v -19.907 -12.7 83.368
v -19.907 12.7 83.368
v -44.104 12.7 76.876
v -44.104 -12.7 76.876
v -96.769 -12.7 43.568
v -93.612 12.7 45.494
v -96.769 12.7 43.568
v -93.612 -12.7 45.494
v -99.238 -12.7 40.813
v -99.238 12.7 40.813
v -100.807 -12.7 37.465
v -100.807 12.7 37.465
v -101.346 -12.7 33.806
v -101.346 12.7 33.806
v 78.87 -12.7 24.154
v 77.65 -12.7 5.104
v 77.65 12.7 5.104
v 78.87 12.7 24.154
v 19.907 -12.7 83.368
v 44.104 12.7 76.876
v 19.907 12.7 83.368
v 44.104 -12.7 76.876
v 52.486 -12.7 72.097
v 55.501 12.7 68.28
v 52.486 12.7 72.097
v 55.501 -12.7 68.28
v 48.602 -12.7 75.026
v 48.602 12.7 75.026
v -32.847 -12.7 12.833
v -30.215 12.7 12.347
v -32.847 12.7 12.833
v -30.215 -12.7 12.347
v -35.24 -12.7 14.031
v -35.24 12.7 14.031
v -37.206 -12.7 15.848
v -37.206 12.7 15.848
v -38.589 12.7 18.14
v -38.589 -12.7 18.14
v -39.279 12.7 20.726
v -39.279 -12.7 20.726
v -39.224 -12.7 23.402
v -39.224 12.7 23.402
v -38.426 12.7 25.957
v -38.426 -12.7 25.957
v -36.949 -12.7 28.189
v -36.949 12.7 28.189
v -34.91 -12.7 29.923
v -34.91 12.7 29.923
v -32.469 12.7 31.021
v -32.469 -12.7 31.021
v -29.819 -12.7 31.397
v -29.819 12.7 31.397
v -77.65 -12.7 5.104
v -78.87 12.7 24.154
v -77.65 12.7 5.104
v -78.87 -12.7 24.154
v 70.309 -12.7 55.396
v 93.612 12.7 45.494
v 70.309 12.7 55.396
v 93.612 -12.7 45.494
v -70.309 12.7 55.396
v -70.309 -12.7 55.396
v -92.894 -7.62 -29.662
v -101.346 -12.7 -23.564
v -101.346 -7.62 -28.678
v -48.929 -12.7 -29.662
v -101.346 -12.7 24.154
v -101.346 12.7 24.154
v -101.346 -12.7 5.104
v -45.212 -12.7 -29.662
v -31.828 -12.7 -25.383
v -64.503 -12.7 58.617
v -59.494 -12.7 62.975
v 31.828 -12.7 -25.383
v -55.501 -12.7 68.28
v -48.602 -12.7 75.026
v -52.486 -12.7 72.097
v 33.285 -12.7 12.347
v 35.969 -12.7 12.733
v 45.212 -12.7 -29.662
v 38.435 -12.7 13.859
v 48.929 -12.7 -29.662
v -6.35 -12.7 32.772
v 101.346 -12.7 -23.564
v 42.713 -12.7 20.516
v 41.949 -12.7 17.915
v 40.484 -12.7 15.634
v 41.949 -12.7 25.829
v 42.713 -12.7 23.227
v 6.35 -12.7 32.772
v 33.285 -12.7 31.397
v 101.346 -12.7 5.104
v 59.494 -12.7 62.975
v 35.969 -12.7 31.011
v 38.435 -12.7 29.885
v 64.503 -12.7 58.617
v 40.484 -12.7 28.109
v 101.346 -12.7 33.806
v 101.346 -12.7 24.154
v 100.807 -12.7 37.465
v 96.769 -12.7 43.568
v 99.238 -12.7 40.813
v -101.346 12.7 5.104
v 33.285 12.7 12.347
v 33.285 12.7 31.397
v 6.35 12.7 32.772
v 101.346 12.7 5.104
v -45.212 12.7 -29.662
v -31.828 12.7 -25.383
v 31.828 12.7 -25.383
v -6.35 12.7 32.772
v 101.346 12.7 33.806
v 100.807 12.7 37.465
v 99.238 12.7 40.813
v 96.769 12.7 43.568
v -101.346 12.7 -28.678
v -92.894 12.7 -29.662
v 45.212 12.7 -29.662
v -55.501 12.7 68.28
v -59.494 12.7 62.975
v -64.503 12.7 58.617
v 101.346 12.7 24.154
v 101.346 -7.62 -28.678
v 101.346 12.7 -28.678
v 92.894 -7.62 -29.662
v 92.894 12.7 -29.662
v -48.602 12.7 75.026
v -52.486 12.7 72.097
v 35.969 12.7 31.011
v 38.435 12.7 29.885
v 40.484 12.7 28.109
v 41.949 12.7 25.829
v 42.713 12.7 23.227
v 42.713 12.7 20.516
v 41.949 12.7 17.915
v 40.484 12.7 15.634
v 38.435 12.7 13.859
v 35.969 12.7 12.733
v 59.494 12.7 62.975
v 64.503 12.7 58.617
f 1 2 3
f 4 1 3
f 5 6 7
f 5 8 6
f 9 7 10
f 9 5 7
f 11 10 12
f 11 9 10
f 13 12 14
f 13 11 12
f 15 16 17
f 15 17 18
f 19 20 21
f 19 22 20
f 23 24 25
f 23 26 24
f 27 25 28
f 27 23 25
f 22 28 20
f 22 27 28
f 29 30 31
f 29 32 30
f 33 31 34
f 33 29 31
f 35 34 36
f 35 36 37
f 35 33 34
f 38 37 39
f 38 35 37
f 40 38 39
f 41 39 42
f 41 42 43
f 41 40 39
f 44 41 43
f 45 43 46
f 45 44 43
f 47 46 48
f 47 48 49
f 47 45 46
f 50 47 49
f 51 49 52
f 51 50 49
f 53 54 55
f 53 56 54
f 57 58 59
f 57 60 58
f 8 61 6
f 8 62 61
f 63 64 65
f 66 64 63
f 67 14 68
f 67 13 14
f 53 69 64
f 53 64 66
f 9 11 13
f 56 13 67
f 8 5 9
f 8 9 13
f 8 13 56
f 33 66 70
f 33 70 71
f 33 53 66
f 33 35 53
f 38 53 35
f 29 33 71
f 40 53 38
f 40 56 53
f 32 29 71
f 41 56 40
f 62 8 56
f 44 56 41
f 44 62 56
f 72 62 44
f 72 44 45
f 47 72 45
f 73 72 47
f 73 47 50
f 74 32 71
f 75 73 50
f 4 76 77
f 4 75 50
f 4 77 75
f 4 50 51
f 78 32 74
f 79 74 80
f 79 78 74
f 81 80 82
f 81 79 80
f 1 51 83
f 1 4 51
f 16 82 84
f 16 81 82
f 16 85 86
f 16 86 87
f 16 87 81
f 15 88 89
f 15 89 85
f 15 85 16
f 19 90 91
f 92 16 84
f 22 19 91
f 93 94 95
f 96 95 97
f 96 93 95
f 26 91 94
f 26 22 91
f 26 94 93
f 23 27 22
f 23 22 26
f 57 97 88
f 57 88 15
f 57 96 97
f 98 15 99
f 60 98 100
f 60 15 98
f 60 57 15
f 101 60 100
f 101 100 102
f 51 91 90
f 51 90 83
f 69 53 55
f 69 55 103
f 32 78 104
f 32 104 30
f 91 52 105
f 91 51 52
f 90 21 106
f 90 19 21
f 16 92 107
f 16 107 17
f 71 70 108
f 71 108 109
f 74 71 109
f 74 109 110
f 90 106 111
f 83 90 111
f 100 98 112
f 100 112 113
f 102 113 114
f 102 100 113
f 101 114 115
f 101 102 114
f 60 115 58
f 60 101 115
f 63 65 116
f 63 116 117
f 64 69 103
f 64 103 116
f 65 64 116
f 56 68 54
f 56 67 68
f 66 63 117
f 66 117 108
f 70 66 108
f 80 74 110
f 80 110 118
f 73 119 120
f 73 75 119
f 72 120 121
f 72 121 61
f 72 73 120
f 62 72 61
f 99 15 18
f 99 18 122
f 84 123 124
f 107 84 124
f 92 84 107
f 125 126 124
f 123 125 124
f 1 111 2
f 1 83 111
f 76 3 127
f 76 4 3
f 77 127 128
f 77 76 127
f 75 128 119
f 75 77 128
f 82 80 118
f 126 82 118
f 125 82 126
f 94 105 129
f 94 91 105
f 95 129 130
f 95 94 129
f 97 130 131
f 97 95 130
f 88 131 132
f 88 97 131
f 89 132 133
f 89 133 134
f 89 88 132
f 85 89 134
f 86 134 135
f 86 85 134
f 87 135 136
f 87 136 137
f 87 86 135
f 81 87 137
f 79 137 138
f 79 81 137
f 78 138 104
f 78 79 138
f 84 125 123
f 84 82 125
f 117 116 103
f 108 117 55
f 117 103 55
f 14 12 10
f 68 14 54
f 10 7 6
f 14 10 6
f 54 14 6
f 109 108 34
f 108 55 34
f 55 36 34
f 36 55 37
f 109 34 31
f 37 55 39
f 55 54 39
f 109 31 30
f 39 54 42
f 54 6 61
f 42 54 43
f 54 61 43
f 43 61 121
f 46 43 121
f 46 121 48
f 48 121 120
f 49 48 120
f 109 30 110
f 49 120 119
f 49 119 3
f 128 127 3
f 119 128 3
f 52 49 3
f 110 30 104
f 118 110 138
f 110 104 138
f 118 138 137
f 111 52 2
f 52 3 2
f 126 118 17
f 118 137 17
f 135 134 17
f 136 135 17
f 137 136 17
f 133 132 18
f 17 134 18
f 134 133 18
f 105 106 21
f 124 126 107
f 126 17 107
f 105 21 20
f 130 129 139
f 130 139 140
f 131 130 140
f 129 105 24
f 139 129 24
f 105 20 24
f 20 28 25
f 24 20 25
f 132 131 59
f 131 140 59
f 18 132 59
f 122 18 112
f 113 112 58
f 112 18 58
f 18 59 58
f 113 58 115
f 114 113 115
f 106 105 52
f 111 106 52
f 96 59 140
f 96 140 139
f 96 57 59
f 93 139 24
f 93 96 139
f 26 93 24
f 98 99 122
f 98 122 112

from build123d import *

# Parameters (mm, degrees)
F1_DEPTH = 12.7
F2_SIZE  = 5.08


with BuildPart() as f1:
    # F0 (on Front) → F1 (new body, symmetric)
    with BuildSketch(Plane.XZ):
        with BuildLine():
            Line((-78.86985, 24.153677), (-77.649682, 5.103677))
            Line((-77.649682, 5.103677), (-101.346, 5.103677))
            Line((-101.346, 5.103677), (-101.346, -28.678323))
            Line((-101.346, -28.678323), (-92.893675, -29.661545))
            Line((-92.893675, -29.661545), (-45.212, -29.661545))
            Line((-45.212, -29.661545), (-31.82804, -25.383405))
            Line((-31.82804, -25.383405), (31.82804, -25.383405))
            Line((31.82804, -25.383405), (45.212, -29.661545))
            Line((45.212, -29.661545), (92.893675, -29.661545))
            Line((92.893675, -29.661545), (101.346, -28.678323))
            Line((101.346, -28.678323), (101.346, 5.103677))
            Line((101.346, 5.103677), (77.649682, 5.103677))
            Line((77.649682, 5.103677), (78.86985, 24.153677))
            Line((78.86985, 24.153677), (101.346, 24.153677))
            Line((101.346, 24.153677), (101.346, 33.805677))
            ThreePointArc((101.346, 33.805677), (99.237568, 40.813436), (93.612348, 45.494363))
            Line((93.612348, 45.494363), (70.308838, 55.395677))
            ThreePointArc((70.308838, 55.395677), (61.88423, 60.664586), (55.500858, 68.27957))
            ThreePointArc((55.500858, 68.27957), (50.637881, 73.685788), (44.103503, 76.876033))
            Line((44.103503, 76.876033), (19.907397, 83.368455))
            Line((19.907397, 83.368455), (6.35, 32.77156))
            Line((6.35, 32.77156), (-6.35, 32.77156))
            Line((-6.35, 32.77156), (-19.907397, 83.368455))
            Line((-19.907397, 83.368455), (-44.103503, 76.876033))
            ThreePointArc((-44.103503, 76.876033), (-50.637881, 73.685788), (-55.500858, 68.27957))
            ThreePointArc((-55.500858, 68.27957), (-61.88423, 60.664586), (-70.308838, 55.395677))
            Line((-70.308838, 55.395677), (-93.612348, 45.494363))
            ThreePointArc((-93.612348, 45.494363), (-99.237568, 40.813436), (-101.346, 33.805677))
            Line((-101.346, 33.805677), (-101.346, 24.153677))
            Line((-101.346, 24.153677), (-78.86985, 24.153677))
        make_face()
        with BuildLine():
            Line((33.285186, 12.346792), (-30.214814, 12.346792))
            ThreePointArc((-30.214814, 12.346792), (-39.345917, 22.065697), (-29.81886, 31.396792))
            Line((-29.81886, 31.396792), (33.285186, 31.396792))
            ThreePointArc((33.285186, 31.396792), (42.810186, 21.871792), (33.285186, 12.346792))
        make_face(mode=Mode.SUBTRACT)
    extrude(amount=F1_DEPTH, both=True)

    # F2
    f2_edges = [f1.edges().sort_by_distance(p)[0] for p in [
        (-97.119838, -12.7, -29.169934),
        (97.119838, -12.7, -29.169934),
    ]]
    chamfer(f2_edges, length=F2_SIZE)


solid = f1.part
